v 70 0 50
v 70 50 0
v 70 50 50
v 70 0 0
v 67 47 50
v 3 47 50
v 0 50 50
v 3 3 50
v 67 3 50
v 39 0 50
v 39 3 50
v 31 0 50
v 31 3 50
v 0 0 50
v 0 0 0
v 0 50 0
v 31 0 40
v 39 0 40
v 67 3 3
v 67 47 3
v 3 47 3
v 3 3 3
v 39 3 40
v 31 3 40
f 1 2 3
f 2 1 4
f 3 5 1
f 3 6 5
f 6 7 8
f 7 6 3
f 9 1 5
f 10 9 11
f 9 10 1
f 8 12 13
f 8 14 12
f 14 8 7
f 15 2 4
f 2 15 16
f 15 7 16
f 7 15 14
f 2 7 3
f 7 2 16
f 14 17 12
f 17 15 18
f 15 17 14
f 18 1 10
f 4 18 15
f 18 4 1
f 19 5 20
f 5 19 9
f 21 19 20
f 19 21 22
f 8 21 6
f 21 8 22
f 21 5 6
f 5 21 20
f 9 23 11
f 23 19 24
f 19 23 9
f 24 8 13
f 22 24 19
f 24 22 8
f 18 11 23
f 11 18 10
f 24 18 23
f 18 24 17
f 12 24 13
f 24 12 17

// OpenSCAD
$fn = 32;

// ----------------------------------------------------------------------
// Enclosure box: notch enclosure
// ----------------------------------------------------------------------

// --- parameters (mm) ---
box_l = 70;               // outer length, X
box_w = 50;               // outer width, Y
box_h = 50;               // outer height
wall_t = 3;               // wall thickness
notch_w = 8;              // cable notch width
notch_h = 10;             // cable notch height

inner_h = box_h - wall_t;  // cavity depth
boss_h = inner_h - 2;  // corner boss height

difference() {
  cube([box_l, box_w, box_h]);
  translate([wall_t, wall_t, wall_t])
    cube([box_l - 2 * wall_t, box_w - 2 * wall_t, box_h]);
  translate([box_l / 2 - notch_w / 2, -1, box_h - notch_h])
    cube([notch_w, wall_t + 2, notch_h + 1]);
}
